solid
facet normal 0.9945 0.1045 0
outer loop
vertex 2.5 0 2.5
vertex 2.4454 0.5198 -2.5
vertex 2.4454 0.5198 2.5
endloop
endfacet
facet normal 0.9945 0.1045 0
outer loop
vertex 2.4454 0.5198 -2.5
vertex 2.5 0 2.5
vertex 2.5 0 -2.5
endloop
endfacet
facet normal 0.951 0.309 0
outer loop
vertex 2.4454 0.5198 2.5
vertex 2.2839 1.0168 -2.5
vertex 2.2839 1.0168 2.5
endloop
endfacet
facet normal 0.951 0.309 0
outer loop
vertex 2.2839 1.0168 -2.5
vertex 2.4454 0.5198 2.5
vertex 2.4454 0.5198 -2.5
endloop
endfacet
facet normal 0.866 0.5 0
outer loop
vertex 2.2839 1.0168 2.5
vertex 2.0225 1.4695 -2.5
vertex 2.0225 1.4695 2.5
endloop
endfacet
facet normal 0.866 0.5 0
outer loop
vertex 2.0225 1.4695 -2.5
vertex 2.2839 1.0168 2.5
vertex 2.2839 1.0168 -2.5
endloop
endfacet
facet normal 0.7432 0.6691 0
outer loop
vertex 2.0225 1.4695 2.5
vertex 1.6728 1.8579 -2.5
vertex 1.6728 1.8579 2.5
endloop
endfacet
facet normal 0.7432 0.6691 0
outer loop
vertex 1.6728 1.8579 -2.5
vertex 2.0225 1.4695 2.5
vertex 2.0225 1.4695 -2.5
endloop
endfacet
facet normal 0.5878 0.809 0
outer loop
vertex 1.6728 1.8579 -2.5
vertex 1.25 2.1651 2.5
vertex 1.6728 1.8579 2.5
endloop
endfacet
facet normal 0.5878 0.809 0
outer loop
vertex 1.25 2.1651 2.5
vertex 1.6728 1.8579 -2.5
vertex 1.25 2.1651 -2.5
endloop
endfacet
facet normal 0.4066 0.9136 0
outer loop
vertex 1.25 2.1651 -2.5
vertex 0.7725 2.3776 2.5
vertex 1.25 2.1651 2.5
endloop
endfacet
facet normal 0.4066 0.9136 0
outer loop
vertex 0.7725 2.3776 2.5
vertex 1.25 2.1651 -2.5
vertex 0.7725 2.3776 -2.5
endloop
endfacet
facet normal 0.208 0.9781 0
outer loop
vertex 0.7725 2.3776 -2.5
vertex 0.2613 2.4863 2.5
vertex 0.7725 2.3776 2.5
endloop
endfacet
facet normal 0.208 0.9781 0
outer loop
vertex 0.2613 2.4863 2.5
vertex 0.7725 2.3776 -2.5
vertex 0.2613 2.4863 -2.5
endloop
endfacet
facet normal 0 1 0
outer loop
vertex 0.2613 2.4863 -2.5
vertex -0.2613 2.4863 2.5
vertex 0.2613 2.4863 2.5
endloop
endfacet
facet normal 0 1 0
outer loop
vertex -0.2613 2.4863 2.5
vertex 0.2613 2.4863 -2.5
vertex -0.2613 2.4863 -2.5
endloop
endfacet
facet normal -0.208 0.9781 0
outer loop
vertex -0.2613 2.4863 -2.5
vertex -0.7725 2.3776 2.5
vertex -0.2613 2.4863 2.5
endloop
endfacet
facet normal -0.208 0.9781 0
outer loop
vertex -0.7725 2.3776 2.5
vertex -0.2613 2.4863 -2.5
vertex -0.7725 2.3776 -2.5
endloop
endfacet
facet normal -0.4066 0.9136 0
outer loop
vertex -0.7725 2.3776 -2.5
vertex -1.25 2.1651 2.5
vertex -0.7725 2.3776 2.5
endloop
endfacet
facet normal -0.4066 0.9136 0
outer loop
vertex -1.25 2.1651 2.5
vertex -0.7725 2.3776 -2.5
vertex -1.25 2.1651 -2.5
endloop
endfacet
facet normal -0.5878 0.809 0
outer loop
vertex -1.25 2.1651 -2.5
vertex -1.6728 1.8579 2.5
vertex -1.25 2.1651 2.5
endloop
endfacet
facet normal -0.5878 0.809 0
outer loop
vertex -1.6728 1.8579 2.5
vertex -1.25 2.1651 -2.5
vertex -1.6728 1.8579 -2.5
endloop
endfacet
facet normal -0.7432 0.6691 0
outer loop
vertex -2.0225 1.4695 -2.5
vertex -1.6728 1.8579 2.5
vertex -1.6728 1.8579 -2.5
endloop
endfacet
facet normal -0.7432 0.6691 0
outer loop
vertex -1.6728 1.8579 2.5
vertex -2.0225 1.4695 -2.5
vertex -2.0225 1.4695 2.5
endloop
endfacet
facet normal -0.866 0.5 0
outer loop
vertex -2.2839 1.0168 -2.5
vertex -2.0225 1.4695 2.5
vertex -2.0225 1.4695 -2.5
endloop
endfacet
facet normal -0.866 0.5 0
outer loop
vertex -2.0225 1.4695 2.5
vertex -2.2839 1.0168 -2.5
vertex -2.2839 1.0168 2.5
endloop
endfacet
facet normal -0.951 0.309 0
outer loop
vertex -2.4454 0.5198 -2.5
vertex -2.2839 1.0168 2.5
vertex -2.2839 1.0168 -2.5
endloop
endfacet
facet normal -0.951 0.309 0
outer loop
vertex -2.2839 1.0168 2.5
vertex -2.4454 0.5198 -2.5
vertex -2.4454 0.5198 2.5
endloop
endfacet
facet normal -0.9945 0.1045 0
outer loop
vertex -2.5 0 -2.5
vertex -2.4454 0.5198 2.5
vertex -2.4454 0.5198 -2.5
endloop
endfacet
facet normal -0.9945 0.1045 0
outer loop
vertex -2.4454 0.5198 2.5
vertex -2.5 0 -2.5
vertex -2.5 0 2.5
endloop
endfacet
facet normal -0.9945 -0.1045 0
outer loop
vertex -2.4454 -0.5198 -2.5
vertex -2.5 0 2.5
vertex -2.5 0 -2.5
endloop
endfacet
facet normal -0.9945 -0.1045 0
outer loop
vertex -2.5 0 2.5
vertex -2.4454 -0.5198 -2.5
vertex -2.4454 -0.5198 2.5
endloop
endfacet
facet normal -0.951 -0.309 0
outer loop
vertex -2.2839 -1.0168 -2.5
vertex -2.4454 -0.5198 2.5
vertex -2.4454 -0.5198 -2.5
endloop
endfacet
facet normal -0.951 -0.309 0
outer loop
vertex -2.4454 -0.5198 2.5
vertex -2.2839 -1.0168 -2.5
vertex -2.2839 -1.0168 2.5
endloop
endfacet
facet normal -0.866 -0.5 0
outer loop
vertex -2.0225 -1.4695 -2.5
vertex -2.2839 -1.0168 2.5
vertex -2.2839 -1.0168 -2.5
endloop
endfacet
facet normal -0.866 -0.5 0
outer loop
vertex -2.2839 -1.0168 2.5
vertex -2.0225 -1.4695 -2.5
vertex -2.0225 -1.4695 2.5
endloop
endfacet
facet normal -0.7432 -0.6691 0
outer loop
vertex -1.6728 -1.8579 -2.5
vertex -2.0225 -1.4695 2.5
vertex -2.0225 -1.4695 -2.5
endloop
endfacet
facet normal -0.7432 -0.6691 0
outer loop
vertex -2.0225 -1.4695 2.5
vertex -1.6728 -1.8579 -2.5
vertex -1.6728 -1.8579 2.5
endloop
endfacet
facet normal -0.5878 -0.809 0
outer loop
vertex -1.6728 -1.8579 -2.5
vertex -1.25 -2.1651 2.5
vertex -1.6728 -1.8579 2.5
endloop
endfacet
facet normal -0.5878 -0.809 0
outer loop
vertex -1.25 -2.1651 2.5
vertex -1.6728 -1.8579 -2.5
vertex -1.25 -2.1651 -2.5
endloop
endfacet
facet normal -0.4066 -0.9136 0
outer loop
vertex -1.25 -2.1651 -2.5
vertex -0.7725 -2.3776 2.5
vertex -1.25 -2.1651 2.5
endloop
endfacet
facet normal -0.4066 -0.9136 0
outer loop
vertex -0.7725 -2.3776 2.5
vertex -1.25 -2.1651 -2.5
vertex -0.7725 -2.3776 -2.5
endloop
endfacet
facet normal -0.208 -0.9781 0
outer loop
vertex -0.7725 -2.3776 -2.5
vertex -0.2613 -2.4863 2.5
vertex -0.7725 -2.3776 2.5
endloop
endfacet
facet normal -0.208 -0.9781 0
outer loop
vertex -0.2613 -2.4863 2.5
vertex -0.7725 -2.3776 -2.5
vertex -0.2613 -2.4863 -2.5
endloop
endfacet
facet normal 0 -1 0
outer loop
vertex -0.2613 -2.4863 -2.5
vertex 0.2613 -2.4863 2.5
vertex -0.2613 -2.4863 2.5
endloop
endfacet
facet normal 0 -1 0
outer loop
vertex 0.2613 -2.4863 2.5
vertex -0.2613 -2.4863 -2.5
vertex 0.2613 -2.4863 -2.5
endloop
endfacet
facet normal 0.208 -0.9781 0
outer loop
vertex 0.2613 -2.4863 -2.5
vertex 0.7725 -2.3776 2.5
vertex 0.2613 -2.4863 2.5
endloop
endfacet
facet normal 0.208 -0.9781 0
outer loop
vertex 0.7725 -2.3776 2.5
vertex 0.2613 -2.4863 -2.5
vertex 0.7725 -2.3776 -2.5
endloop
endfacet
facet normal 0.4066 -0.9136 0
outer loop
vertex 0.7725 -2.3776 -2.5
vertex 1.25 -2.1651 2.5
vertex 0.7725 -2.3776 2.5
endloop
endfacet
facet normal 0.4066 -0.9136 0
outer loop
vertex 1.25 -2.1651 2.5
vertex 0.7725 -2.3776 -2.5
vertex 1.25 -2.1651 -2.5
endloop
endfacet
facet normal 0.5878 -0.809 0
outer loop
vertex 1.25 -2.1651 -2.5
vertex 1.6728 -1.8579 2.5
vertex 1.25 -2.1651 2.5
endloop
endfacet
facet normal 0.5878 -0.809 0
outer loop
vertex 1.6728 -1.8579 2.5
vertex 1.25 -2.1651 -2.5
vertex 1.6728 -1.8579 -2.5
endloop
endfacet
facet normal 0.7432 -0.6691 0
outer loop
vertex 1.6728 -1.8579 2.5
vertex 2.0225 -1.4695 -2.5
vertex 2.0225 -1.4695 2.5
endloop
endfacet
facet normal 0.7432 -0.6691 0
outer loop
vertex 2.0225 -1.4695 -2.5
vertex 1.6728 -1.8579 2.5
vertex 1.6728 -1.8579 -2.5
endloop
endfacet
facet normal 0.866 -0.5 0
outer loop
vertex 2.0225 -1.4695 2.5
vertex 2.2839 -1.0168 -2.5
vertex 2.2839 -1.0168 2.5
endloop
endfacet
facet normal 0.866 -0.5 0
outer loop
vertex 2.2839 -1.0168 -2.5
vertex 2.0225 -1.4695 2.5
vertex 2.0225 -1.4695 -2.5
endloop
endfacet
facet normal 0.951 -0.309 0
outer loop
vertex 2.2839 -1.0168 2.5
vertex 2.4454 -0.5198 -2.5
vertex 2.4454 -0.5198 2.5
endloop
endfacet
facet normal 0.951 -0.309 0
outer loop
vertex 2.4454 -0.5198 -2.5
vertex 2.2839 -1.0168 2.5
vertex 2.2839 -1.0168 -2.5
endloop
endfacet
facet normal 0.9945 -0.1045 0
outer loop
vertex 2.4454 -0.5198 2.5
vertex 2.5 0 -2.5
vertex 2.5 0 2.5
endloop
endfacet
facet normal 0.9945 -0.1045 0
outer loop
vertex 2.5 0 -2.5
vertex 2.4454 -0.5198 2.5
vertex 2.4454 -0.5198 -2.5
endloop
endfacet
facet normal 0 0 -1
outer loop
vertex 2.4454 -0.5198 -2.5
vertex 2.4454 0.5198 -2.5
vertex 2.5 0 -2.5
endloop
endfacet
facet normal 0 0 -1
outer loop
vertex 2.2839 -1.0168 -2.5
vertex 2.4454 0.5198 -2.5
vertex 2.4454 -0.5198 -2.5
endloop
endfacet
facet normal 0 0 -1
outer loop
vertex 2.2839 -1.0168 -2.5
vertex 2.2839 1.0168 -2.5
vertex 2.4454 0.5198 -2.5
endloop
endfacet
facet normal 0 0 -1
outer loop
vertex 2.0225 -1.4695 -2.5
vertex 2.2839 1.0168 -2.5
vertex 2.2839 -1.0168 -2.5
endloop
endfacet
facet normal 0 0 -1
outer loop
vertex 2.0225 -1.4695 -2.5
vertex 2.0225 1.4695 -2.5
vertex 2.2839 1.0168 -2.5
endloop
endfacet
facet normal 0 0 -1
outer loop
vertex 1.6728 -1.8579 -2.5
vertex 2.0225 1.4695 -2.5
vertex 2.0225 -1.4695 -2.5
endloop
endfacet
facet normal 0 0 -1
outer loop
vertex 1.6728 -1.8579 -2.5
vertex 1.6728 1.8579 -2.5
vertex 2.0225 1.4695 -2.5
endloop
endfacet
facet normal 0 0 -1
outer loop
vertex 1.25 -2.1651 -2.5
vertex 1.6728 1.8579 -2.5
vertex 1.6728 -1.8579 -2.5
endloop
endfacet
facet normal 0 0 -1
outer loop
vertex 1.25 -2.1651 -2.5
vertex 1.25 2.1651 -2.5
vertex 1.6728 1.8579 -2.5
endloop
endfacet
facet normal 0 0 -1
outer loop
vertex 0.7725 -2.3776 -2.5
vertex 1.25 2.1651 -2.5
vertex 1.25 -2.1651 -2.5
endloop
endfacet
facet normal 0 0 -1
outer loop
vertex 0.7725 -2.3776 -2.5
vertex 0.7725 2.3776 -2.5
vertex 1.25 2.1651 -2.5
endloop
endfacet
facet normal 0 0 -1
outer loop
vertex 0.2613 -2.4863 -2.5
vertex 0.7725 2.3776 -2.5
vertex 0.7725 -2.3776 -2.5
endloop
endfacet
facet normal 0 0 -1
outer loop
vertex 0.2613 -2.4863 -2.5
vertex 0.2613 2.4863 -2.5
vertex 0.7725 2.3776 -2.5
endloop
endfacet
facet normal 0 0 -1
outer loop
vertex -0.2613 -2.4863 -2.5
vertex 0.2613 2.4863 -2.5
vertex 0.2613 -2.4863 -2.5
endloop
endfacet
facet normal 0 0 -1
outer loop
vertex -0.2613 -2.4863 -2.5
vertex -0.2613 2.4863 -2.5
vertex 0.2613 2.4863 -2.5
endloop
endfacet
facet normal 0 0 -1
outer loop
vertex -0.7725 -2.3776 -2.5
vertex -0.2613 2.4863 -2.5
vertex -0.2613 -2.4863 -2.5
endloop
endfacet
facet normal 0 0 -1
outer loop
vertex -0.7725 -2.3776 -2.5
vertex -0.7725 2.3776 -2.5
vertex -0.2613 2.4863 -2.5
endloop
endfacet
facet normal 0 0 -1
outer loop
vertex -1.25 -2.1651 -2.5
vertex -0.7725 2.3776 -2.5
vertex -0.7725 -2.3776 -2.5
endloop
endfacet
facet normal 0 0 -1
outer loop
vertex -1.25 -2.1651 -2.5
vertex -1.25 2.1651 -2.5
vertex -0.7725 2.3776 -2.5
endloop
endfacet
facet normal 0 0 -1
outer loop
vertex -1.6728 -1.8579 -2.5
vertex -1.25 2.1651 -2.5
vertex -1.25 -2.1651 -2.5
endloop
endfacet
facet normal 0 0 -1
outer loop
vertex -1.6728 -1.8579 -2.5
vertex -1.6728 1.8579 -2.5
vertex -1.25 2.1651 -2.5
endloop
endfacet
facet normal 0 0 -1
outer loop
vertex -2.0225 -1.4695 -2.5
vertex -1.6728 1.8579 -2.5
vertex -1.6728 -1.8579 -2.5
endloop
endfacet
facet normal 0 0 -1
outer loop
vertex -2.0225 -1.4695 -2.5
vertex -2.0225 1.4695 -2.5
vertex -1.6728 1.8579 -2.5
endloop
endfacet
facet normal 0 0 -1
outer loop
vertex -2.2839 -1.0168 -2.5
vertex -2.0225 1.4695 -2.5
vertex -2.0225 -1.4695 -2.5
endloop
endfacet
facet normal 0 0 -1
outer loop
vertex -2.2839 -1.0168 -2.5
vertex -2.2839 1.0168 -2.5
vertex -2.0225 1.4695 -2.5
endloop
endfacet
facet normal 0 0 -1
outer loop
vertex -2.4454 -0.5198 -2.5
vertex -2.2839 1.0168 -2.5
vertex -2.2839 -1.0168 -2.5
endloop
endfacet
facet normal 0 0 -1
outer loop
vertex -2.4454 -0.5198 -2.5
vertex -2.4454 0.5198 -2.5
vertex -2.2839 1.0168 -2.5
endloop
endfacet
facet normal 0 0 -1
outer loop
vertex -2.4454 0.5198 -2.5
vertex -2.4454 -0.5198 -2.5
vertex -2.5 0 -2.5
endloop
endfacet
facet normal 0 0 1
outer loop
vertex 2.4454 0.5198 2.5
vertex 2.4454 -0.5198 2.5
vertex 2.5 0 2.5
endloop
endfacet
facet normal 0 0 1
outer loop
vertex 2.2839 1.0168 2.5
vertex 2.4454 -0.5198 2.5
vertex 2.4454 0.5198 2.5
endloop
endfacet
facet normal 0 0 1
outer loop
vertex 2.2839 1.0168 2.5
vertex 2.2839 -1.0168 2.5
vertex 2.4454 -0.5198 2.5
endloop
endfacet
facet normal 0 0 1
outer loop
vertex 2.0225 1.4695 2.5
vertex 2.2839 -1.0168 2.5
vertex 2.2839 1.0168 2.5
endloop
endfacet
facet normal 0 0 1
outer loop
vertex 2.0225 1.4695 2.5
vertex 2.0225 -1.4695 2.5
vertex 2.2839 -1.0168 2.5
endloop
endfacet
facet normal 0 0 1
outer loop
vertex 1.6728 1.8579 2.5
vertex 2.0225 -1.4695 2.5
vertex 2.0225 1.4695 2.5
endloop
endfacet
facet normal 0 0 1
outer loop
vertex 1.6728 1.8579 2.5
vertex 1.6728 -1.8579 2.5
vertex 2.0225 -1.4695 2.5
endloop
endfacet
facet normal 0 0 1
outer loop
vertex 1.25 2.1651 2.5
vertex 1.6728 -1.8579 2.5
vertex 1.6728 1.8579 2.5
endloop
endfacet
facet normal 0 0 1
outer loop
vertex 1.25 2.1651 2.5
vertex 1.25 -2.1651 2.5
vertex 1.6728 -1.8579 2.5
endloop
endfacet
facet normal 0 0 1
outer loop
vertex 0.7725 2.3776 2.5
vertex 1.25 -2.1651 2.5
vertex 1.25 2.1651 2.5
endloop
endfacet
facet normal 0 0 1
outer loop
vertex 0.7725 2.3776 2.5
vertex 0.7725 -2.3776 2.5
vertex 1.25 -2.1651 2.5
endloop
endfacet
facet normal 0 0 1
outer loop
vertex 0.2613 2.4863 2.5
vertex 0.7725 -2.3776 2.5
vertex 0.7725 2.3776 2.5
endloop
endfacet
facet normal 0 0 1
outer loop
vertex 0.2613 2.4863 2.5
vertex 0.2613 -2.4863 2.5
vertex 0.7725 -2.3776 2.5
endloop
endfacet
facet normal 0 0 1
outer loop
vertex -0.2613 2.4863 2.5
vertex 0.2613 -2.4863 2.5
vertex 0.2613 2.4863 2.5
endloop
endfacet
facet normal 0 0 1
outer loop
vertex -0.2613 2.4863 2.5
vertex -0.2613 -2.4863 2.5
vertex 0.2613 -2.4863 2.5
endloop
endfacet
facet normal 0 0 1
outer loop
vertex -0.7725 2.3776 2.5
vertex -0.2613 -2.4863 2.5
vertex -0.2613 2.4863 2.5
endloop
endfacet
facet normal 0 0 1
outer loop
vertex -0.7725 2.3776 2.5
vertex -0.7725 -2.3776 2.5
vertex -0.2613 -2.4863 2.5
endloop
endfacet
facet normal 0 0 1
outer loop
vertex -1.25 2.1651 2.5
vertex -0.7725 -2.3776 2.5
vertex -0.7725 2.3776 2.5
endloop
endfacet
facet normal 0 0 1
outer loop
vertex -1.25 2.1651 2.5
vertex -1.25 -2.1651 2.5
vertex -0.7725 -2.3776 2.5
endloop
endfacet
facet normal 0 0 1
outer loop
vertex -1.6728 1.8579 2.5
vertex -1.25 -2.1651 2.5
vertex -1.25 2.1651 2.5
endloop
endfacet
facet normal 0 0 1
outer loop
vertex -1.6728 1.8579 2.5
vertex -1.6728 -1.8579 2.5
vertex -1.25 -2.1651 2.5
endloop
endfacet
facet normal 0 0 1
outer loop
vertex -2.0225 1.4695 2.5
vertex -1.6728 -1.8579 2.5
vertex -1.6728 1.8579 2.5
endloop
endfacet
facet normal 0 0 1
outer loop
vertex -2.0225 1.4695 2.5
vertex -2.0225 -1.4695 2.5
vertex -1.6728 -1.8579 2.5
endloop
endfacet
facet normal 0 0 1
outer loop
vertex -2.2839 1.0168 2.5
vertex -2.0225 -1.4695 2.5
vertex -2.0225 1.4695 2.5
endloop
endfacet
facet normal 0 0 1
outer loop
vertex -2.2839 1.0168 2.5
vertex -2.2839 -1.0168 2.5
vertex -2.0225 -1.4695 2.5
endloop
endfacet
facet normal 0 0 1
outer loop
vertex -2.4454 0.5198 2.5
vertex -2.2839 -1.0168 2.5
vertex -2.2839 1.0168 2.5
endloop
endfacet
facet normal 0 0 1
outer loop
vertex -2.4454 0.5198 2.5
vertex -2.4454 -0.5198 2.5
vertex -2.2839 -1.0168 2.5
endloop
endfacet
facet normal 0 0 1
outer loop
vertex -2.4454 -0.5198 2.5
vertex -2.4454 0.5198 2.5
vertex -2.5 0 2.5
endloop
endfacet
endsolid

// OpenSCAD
color("CornflowerBlue")cylinder($fn = 30, $fa = 1, $fs = 1, h = 5, r1 = 2.5, r2 = 2.5, center = true);
